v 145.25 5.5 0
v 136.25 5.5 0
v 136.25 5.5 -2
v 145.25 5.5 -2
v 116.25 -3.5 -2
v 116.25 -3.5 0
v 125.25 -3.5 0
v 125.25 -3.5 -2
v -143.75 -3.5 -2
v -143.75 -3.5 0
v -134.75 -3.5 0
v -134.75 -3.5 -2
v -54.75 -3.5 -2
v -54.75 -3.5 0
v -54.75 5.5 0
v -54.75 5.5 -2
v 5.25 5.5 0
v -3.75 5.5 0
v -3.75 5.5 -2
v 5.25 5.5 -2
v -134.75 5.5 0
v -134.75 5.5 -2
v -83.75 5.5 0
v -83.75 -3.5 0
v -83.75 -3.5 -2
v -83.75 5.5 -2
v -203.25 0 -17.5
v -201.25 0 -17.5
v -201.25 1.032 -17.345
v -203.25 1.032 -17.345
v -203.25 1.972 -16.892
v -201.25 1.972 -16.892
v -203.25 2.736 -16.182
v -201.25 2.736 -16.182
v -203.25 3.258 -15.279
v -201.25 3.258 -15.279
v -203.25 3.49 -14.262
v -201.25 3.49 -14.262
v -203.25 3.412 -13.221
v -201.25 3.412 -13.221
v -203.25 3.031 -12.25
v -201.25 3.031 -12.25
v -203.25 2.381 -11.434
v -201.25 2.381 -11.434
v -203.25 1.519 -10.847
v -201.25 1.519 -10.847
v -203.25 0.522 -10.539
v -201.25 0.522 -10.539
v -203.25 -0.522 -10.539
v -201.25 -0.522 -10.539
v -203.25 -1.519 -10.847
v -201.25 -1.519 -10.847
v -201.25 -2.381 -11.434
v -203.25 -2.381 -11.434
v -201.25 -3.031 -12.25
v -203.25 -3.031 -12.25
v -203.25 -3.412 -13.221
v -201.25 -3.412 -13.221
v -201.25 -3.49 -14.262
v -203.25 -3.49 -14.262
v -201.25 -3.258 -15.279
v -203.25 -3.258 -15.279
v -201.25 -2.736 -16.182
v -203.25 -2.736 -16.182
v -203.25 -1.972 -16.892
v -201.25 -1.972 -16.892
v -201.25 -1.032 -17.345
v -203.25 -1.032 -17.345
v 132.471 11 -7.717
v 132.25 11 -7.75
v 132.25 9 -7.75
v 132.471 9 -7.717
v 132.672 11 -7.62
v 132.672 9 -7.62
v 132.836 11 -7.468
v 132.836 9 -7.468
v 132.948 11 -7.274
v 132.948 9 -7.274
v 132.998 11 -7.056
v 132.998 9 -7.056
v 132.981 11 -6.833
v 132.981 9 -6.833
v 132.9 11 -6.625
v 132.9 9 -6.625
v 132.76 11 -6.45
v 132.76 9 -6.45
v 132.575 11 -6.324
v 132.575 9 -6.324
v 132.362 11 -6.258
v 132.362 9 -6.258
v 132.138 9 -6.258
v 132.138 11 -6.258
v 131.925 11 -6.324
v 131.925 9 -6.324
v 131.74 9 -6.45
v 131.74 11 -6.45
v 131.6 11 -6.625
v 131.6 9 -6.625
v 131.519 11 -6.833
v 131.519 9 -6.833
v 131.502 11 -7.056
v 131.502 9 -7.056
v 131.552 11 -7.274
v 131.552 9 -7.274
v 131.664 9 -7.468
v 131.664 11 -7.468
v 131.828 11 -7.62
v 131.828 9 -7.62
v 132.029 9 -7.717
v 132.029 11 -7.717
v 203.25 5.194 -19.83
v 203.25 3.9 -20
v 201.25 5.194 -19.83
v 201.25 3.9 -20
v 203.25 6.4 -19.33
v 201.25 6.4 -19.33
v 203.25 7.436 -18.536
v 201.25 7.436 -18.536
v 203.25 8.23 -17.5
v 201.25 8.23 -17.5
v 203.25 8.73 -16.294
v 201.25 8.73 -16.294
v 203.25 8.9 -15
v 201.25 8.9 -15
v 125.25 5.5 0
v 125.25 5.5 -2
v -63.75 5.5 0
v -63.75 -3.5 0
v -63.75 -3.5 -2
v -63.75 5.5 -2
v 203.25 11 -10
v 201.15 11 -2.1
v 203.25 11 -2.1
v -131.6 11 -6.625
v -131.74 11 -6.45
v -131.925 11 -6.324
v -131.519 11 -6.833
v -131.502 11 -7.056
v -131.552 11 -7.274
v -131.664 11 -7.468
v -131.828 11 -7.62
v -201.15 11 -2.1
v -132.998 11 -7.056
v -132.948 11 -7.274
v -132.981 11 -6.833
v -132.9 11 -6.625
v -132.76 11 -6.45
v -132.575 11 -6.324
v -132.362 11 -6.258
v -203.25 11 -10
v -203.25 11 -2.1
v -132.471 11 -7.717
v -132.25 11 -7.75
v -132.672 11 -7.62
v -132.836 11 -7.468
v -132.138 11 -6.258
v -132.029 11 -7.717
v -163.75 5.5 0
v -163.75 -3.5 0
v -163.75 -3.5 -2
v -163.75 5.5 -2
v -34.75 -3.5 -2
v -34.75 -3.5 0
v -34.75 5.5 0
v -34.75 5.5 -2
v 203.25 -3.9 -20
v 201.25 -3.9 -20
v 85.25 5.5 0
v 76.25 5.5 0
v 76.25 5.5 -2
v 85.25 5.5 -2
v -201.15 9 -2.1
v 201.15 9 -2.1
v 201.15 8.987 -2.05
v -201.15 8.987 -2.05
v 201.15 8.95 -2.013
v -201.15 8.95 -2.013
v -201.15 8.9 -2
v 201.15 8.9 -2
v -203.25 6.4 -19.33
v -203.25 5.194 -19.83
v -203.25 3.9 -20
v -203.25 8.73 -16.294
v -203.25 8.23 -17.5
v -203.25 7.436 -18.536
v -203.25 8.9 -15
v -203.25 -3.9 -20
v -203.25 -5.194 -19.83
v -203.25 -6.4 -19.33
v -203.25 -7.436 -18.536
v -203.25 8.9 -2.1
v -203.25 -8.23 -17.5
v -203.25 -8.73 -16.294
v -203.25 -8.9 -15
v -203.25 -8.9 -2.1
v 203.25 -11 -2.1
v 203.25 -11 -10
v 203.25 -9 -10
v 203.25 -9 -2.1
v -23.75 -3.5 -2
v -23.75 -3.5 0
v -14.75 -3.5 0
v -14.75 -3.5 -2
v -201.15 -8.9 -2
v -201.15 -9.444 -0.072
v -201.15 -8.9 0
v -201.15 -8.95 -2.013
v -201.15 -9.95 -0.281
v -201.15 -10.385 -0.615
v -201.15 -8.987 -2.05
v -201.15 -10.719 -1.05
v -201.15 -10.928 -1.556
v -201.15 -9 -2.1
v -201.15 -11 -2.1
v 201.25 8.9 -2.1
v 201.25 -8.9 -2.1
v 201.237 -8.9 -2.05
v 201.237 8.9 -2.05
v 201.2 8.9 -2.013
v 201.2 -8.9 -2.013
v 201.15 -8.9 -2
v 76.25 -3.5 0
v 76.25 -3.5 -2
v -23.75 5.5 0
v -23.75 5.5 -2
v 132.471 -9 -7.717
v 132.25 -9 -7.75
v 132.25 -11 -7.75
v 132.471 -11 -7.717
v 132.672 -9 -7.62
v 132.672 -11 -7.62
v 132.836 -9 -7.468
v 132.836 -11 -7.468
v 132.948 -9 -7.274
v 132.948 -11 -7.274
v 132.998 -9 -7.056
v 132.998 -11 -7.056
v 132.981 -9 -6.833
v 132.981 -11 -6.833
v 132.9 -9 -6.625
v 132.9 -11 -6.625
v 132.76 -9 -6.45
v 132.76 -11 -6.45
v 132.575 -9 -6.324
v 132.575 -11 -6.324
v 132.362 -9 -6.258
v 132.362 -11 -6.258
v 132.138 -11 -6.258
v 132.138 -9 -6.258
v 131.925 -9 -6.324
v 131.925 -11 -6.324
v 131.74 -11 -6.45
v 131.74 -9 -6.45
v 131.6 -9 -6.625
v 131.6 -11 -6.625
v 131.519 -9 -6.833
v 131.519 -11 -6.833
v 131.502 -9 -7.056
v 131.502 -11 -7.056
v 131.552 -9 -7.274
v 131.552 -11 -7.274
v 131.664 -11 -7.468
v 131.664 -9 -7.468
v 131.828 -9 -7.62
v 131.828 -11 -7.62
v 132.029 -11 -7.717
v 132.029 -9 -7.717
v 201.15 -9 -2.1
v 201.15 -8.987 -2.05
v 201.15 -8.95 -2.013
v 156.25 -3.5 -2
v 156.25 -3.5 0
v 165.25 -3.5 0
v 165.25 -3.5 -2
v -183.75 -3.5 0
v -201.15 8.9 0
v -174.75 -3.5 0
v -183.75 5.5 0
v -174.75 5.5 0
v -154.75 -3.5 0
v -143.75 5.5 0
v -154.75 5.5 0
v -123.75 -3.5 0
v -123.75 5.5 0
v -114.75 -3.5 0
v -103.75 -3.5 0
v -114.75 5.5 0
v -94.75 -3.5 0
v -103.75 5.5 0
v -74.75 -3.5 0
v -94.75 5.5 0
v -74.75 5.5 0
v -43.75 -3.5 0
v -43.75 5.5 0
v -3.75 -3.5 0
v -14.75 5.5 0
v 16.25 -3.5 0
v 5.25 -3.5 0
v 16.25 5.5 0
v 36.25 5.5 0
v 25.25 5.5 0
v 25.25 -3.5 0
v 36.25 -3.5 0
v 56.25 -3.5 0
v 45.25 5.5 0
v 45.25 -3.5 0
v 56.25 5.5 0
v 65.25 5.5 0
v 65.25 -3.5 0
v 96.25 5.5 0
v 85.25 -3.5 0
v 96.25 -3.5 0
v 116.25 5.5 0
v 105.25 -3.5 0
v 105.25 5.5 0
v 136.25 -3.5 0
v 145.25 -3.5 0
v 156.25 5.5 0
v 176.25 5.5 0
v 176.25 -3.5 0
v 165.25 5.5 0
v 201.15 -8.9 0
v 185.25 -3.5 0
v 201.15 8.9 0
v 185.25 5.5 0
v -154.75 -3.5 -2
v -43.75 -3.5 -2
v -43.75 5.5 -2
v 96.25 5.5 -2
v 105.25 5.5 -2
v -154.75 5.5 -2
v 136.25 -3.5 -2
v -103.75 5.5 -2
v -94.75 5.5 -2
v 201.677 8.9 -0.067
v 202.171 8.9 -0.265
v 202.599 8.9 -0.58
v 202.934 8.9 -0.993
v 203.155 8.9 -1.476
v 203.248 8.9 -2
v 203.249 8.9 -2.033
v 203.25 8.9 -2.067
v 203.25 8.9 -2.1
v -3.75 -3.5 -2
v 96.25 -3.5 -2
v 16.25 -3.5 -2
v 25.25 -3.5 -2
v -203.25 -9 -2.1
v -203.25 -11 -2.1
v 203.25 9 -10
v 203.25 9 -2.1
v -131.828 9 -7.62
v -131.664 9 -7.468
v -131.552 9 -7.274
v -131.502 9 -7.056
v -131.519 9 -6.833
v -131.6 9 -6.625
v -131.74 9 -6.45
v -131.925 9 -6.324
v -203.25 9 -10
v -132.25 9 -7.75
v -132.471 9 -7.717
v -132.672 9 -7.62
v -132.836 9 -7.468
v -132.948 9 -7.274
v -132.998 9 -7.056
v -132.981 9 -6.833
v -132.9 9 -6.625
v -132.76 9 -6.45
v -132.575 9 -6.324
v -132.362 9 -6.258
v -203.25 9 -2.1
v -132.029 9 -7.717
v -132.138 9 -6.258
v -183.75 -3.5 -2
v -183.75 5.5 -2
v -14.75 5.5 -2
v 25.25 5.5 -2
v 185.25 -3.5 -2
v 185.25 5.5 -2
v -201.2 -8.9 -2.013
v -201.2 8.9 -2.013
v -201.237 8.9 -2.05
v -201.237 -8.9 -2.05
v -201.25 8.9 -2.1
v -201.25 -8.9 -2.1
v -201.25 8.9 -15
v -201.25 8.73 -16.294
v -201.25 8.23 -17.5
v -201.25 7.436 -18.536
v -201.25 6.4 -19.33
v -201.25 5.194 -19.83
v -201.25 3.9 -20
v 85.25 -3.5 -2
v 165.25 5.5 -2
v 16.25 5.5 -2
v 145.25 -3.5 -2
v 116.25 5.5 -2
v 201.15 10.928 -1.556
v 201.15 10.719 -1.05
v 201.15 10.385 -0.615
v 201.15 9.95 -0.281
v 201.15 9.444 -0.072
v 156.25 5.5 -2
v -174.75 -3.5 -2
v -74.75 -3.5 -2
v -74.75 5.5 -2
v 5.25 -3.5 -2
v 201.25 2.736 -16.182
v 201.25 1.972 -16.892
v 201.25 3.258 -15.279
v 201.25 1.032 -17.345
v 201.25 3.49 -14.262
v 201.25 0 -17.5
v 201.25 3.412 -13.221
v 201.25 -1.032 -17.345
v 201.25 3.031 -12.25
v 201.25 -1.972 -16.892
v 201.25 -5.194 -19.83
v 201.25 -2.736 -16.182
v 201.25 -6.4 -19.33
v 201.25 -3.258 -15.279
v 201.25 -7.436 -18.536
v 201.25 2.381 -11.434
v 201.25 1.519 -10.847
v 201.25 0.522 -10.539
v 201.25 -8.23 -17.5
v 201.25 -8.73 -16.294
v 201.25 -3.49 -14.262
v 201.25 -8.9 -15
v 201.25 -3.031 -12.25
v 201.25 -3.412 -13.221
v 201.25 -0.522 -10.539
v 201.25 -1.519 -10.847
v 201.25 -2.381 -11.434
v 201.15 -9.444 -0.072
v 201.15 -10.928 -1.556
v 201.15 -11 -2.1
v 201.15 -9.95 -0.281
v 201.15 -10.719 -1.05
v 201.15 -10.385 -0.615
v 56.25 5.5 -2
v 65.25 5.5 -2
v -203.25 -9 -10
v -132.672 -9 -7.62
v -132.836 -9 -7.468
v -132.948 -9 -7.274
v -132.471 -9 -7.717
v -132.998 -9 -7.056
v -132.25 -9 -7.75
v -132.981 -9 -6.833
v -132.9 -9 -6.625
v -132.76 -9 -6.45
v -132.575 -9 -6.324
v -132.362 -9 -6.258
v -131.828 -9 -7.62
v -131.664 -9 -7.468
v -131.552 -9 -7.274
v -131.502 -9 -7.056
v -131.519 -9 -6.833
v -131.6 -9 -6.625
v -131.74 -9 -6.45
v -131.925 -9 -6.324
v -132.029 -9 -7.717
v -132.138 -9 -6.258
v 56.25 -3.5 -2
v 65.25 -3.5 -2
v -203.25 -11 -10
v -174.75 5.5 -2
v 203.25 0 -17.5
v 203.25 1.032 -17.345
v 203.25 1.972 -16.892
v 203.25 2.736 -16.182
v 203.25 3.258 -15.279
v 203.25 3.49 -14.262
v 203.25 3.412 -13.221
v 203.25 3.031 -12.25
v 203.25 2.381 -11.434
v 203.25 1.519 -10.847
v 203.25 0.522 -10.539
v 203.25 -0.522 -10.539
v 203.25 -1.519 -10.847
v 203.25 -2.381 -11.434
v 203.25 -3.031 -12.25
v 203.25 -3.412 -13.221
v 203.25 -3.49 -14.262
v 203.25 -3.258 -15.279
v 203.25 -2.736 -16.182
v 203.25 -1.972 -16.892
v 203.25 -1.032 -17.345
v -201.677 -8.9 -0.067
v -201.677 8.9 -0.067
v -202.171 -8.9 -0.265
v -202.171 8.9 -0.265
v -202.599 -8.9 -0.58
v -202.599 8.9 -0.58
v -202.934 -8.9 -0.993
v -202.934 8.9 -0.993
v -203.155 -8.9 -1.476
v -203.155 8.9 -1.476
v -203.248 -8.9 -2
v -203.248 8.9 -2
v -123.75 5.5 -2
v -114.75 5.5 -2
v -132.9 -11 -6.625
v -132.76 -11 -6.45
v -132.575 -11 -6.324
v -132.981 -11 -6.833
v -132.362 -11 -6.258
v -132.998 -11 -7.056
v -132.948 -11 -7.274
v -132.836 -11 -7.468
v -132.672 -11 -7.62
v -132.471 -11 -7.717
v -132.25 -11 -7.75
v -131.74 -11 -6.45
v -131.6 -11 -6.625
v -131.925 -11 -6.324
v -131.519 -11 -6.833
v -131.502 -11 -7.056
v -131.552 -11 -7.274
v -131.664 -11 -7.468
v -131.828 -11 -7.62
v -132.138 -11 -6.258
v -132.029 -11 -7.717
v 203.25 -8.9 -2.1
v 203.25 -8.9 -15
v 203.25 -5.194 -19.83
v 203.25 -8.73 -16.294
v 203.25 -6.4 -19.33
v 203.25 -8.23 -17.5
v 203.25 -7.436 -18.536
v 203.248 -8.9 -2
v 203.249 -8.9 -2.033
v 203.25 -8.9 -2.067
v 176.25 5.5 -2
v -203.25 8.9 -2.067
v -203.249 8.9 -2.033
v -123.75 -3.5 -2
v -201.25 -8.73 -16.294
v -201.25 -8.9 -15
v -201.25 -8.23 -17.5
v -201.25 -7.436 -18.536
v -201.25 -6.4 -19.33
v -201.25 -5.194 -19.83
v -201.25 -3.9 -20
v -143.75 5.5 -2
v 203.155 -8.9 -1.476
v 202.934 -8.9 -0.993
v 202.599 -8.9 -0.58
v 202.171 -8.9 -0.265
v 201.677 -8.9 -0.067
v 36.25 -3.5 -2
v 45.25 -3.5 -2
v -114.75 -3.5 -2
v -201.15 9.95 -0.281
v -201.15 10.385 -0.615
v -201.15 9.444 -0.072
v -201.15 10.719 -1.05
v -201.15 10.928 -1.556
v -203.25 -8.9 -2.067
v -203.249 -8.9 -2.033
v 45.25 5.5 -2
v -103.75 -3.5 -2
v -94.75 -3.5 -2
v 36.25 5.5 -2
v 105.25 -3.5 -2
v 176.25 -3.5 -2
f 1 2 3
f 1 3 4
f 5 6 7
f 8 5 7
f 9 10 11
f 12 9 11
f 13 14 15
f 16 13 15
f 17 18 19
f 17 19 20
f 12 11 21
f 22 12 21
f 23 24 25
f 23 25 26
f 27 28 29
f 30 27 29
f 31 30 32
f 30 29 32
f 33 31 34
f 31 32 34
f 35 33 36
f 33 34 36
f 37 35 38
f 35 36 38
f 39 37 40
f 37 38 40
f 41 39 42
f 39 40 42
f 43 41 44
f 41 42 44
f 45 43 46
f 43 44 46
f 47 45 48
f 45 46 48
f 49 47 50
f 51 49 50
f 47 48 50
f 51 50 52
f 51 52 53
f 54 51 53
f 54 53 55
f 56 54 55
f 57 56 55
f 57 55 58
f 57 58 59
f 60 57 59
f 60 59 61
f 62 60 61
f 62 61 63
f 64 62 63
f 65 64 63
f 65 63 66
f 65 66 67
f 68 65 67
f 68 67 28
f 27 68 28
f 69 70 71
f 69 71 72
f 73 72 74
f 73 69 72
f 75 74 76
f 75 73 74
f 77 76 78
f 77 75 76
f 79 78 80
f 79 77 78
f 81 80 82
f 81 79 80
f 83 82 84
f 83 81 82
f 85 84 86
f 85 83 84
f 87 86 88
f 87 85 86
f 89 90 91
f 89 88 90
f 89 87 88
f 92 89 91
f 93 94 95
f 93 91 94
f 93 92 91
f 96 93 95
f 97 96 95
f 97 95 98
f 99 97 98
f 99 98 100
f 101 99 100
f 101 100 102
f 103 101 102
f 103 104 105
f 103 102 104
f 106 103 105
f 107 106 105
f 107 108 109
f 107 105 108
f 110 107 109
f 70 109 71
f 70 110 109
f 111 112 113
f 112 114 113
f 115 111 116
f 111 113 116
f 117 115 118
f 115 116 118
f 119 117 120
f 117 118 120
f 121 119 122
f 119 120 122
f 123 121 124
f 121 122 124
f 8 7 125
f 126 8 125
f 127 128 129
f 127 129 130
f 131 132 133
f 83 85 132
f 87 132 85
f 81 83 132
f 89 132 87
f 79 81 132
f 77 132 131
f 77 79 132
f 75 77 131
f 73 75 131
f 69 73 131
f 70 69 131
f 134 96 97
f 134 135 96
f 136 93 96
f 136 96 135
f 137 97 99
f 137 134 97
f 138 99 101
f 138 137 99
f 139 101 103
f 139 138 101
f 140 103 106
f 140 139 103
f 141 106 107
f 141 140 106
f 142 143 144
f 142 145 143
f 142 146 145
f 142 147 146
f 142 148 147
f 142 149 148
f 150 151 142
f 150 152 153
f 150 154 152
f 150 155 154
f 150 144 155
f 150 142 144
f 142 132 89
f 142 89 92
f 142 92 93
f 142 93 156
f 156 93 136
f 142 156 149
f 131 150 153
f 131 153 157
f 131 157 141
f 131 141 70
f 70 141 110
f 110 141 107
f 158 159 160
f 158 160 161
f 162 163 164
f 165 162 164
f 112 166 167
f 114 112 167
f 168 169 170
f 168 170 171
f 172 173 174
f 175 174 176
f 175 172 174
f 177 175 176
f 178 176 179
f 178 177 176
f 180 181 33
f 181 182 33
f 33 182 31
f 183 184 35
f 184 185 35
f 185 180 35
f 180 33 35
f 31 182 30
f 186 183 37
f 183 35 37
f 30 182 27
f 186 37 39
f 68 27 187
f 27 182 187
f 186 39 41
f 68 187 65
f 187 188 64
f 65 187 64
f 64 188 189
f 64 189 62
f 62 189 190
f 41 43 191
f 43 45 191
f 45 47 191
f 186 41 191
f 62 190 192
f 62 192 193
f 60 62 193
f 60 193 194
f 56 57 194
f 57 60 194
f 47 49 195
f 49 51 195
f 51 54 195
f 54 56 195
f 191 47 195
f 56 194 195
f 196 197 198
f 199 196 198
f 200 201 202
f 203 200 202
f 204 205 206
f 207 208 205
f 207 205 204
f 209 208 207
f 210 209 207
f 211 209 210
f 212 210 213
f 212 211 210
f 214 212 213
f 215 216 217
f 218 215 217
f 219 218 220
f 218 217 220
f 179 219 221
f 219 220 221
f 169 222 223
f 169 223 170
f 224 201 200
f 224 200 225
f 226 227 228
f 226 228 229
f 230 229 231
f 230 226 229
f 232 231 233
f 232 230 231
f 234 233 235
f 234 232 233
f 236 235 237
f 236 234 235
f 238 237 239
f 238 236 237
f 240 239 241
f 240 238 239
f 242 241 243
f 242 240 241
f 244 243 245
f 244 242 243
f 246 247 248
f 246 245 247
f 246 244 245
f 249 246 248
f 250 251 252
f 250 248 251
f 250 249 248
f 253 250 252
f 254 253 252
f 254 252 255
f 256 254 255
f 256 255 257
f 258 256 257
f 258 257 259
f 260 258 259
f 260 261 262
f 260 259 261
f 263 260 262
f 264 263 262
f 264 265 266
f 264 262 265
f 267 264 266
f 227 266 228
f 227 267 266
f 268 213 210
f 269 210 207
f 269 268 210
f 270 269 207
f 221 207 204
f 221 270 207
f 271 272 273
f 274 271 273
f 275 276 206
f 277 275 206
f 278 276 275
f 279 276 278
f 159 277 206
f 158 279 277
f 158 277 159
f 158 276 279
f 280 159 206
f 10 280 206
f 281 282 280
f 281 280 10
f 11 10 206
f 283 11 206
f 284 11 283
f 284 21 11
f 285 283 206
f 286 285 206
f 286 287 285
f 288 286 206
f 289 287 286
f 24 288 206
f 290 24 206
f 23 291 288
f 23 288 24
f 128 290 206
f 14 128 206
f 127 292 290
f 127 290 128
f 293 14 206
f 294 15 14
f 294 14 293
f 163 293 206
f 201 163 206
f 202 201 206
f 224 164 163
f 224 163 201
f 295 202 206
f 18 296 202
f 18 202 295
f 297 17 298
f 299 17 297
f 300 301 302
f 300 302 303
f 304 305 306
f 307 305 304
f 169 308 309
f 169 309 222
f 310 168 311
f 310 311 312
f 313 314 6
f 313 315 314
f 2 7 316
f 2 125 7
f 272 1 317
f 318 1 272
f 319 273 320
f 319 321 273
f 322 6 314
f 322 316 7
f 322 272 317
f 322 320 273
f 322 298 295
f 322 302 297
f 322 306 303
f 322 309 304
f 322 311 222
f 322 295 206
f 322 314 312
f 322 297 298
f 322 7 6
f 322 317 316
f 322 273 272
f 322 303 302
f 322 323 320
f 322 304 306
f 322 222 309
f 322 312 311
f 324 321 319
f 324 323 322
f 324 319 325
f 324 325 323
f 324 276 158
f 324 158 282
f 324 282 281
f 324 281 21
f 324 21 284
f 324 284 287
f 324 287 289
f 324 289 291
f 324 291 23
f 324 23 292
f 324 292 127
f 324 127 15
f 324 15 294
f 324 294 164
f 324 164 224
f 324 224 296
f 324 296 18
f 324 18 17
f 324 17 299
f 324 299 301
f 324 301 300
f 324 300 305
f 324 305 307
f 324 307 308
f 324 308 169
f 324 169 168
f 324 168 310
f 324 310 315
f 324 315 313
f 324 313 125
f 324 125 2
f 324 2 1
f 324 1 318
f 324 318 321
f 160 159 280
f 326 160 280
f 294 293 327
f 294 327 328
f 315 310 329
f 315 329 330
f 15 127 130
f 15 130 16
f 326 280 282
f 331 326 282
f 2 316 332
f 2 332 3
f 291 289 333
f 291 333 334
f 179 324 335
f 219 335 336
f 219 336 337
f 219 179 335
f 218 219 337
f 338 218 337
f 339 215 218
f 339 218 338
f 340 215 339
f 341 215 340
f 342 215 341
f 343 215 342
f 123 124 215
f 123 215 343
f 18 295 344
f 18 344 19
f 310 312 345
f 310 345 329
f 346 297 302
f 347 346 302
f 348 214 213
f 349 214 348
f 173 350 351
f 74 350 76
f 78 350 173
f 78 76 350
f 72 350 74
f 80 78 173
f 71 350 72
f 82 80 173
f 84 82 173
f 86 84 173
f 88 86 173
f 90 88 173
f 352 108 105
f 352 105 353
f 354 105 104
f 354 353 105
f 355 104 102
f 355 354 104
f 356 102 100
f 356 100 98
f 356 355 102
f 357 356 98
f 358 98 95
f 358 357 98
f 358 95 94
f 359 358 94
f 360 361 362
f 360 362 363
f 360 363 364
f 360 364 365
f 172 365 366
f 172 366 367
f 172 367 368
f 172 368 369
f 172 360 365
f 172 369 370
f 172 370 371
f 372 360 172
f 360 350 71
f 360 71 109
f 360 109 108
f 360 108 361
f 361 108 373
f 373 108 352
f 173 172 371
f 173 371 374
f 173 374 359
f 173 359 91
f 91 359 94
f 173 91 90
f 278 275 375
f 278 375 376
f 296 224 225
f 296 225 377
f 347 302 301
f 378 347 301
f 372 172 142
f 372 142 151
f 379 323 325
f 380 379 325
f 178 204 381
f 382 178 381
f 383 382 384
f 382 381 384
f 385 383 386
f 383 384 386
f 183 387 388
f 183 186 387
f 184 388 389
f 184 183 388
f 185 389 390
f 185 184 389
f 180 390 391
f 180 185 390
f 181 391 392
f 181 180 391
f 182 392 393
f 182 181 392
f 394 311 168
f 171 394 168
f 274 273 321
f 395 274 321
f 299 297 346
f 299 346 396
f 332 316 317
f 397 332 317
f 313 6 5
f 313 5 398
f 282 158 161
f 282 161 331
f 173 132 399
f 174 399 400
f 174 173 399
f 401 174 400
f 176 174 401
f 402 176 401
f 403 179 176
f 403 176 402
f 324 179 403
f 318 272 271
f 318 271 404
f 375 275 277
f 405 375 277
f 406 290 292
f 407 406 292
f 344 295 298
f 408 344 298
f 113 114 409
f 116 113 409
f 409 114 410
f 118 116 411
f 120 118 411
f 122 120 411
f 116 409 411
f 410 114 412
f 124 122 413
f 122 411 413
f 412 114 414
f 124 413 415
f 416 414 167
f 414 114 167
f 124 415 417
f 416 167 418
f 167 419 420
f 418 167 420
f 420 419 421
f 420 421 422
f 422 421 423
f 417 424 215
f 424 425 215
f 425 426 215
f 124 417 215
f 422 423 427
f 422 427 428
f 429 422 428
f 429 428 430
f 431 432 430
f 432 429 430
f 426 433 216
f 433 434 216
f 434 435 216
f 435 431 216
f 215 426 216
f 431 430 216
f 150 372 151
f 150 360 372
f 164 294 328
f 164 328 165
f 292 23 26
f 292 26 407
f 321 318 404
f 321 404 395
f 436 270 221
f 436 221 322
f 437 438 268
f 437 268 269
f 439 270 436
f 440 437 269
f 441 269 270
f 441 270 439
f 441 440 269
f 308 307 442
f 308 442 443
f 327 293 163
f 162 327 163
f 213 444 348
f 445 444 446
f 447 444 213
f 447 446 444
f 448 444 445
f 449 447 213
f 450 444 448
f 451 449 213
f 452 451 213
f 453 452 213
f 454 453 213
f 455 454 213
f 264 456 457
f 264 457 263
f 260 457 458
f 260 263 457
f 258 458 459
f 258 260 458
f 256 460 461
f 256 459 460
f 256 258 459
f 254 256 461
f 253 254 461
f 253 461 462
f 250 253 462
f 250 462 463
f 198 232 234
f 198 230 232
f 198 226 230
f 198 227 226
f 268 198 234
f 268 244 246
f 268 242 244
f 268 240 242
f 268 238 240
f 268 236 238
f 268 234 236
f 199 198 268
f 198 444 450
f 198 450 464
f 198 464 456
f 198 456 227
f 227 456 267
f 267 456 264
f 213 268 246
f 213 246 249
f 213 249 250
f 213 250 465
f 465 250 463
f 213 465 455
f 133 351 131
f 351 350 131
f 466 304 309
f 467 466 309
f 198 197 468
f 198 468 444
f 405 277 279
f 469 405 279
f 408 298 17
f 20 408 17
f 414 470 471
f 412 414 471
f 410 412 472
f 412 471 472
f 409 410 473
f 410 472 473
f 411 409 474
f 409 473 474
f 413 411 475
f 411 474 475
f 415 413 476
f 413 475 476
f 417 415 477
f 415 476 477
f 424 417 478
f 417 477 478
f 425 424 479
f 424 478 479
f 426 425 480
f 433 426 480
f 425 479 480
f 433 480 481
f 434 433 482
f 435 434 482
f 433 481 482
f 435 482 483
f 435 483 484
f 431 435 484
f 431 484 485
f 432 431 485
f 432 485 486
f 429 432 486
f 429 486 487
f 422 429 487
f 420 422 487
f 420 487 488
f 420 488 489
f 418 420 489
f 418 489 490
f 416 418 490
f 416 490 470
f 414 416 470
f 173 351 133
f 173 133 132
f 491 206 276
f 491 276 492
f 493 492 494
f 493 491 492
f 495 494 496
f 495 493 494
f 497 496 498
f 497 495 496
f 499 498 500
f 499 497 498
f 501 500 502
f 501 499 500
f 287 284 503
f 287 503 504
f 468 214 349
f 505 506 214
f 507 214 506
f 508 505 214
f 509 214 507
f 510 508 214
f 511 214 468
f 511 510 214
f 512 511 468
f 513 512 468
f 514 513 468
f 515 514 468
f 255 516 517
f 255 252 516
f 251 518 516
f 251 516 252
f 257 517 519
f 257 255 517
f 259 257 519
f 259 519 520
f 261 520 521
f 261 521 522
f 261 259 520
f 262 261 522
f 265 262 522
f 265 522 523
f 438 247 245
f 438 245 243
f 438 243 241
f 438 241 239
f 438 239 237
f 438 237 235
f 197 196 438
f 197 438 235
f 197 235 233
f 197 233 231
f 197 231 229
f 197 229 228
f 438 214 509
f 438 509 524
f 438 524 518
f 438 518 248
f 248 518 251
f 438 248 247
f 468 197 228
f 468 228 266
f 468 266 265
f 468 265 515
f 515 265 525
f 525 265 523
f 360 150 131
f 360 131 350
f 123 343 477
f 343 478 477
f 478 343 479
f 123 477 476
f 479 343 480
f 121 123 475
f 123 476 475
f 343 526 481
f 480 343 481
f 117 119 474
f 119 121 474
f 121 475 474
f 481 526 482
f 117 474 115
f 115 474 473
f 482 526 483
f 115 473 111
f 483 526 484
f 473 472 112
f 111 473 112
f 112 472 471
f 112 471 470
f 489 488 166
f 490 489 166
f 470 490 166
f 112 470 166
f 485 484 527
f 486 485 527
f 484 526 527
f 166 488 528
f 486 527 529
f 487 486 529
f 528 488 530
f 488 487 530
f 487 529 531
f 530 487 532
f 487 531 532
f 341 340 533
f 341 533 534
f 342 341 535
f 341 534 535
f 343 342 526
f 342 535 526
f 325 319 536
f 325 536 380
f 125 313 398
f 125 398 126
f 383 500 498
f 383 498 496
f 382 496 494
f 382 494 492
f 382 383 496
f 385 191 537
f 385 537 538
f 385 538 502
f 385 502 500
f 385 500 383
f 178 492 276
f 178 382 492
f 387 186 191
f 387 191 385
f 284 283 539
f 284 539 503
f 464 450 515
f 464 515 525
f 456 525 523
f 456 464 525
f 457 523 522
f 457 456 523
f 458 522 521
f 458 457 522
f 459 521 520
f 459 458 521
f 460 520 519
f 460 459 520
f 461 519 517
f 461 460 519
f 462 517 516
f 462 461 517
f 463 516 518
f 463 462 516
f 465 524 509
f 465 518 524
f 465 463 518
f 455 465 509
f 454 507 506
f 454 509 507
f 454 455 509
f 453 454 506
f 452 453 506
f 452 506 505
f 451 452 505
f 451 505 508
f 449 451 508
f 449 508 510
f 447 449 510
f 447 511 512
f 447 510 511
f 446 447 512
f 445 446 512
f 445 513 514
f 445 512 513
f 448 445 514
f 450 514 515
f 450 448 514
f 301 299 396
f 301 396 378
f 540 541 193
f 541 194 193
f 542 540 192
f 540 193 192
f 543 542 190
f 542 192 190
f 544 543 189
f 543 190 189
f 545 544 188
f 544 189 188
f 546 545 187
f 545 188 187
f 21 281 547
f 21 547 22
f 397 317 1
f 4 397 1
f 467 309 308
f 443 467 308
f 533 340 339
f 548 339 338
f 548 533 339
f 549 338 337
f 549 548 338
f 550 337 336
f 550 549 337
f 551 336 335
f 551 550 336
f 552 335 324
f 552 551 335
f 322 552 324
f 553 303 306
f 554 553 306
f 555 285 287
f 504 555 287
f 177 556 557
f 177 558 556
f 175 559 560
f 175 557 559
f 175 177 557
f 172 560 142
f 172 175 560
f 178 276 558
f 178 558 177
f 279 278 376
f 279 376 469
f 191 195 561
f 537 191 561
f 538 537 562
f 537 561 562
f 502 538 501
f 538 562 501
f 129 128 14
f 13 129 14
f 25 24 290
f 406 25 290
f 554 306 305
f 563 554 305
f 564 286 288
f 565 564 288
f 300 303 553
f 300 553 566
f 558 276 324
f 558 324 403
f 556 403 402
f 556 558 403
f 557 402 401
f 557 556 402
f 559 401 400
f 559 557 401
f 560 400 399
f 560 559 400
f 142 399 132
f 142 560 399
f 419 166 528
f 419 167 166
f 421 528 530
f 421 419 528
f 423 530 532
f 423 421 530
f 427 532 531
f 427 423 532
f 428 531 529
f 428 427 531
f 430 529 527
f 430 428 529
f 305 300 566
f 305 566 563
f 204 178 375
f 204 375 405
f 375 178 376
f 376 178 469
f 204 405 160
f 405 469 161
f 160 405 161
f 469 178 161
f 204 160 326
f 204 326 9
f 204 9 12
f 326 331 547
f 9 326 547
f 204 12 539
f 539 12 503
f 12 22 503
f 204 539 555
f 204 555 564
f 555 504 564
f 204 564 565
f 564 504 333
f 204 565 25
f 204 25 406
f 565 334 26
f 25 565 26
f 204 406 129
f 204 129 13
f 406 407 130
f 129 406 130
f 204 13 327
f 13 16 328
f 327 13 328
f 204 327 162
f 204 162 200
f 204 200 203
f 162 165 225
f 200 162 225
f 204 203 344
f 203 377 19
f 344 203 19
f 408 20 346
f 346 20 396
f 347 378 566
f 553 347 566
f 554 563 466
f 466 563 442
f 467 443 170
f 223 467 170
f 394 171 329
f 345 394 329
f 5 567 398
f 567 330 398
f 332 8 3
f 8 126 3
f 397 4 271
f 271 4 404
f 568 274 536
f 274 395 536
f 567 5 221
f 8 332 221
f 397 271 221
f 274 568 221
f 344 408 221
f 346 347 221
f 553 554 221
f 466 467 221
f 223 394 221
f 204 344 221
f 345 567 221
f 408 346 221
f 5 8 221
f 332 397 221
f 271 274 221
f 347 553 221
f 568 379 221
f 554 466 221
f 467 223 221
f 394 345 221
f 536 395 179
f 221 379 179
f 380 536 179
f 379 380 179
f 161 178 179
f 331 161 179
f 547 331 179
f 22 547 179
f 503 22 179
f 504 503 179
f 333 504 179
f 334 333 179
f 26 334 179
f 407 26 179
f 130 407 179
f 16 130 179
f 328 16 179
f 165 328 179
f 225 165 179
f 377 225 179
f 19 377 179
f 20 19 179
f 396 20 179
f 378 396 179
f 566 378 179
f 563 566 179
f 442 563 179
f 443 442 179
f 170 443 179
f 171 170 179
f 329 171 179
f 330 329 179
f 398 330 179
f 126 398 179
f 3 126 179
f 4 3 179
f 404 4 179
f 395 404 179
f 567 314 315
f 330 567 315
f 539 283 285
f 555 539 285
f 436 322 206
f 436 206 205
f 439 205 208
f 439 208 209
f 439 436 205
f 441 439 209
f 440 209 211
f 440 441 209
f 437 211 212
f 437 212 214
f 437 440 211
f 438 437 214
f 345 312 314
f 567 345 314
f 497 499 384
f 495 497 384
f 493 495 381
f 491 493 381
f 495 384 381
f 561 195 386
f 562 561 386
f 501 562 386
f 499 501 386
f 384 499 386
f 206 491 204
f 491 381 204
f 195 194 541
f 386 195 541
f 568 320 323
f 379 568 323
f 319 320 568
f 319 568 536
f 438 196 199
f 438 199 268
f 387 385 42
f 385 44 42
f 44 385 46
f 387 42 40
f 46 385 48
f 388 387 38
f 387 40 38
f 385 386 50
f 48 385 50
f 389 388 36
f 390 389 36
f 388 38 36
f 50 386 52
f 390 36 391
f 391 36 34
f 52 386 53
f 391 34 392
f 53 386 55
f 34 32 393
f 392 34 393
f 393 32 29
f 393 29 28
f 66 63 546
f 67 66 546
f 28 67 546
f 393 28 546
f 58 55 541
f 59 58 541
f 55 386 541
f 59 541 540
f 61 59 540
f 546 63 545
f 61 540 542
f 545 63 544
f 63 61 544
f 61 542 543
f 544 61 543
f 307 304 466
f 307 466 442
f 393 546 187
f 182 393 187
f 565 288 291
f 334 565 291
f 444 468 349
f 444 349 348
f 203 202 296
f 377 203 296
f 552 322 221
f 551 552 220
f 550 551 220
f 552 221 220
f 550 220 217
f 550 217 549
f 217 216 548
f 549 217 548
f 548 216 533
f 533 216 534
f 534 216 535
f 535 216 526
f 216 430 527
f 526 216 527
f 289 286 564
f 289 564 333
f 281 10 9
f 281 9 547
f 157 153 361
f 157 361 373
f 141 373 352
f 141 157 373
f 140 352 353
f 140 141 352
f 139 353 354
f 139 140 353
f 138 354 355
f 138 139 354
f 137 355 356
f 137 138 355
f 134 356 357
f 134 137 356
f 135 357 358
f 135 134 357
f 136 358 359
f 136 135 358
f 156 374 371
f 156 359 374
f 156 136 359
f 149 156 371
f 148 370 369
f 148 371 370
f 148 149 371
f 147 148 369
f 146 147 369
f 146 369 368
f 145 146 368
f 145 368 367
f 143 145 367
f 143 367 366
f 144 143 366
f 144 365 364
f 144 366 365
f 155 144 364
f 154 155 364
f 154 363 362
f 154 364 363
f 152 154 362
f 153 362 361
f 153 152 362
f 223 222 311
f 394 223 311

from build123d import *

# Parameters (mm, degrees)
SKETCH_1_W                         = 406.5
SKETCH_1_H                         = 22
SM_BASE_FLANGE_1_DEPTH             = 2
SM_EDGE_FLANGE_1_STRIP_W           = 8.2
SM_EDGE_FLANGE_1_STRIP_H           = 2
SM_EDGE_FLANGE_1_STRIP_CUT_DEPTH   = 406.5
SM_EDGE_FLANGE_1_STRIP_2_W         = 8.2
SM_EDGE_FLANGE_1_STRIP_2_H         = 2
SM_EDGE_FLANGE_1_STRIP_CUT_2_DEPTH = 406.5
SM_EDGE_FLANGE_1_DEPTH             = 406.5
SM_EDGE_FLANGE_1_BEND_DEPTH        = 406.5
SM_START                           = -11
SM_EDGE_FLANGE_2_DEPTH             = 22
SM_EDGE_FLANGE_2_2_DEPTH           = 2.1
SM_START_2                         = 8.9
SM_EDGE_FLANGE_2_3_DEPTH           = 2.1
SM_START_3                         = -8.9
SM_EDGE_FLANGE_2_4_DEPTH           = 17.8
SKETCH_18_W                        = 9
SKETCH_18_H                        = 9
CUT_EXTRUDE_1_DEPTH                = 10
PATTERN_LINEAR_1_COUNT             = 19
PATTERN_LINEAR_1_PITCH             = 20
FILLET_1_R                         = 5
SKETCH_19_R                        = 3.5
CUT_EXTRUDE_2_DEPTH                = 408.140332072
CUT_EXTRUDE_3_DEPTH                = 206.413150747
CUT_EXTRUDE_3_DEPTH_BACK           = 206.413150747
SKETCH_20_R                        = 0.75


# Read off the part's stored shape, not the designer's step: 边线-法兰2
# Sheet-metal steps are written as plain solids
with BuildPart() as part:
    # Sketch 1 → 基体-法兰1 (new body)
    with BuildSketch(Plane.XY):
        Rectangle(SKETCH_1_W, SKETCH_1_H)
    extrude(amount=-SM_BASE_FLANGE_1_DEPTH)

    # 边线-法兰1 strip (across the edge) → 边线-法兰1 strip cut (cut)
    with BuildSketch(Plane(origin=(203.25, -11, -2), x_dir=(0, 1, 0), z_dir=(-1, 0, 0))):
        with Locations((-2, -1)):
            Rectangle(SM_EDGE_FLANGE_1_STRIP_W, SM_EDGE_FLANGE_1_STRIP_H)
    extrude(amount=SM_EDGE_FLANGE_1_STRIP_CUT_DEPTH, mode=Mode.SUBTRACT)

    # 边线-法兰1 strip 2 (across the edge) → 边线-法兰1 strip cut 2 (cut)
    with BuildSketch(Plane(origin=(-203.25, 11, -2), x_dir=(0, -1, 0), z_dir=(1, 0, 0))):
        with Locations((-2, -1)):
            Rectangle(SM_EDGE_FLANGE_1_STRIP_2_W, SM_EDGE_FLANGE_1_STRIP_2_H)
    extrude(amount=SM_EDGE_FLANGE_1_STRIP_CUT_2_DEPTH, mode=Mode.SUBTRACT)

    # 边线-法兰1 section (across the edge) → 边线-法兰1 (add)
    with BuildSketch(Plane(origin=(203.25, -11, -2), x_dir=(0, 1, 0), z_dir=(-1, 0, 0))):
        with BuildLine():
            Line((0, 0.1), (0, 8))
            Line((0, 8), (2, 8))
            Line((2, 8), (2, 0.1))
            ThreePointArc((2, 0.1), (2.029289322, 0.029289322), (2.1, 0))
            Line((2.1, 0), (2.1, -2))
            ThreePointArc((2.1, -2), (0.61507576, -1.38492424), (0, 0.1))
        make_face()
    extrude(amount=SM_EDGE_FLANGE_1_DEPTH)

    # 边线-法兰1 section 2 (across the edge) → 边线-法兰1 bend (add)
    with BuildSketch(Plane(origin=(-203.25, 11, -2), x_dir=(0, -1, 0), z_dir=(1, 0, 0))):
        with BuildLine():
            Line((0, 0.1), (0, 8))
            Line((0, 8), (2, 8))
            Line((2, 8), (2, 0.1))
            ThreePointArc((2, 0.1), (2.029289322, 0.029289322), (2.1, 0))
            Line((2.1, 0), (2.1, -2))
            ThreePointArc((2.1, -2), (0.61507576, -1.38492424), (0, 0.1))
        make_face()
    extrude(amount=SM_EDGE_FLANGE_1_BEND_DEPTH)

    # 边线-法兰2 outline → 边线-法兰2 (cut)
    with BuildSketch(Plane(origin=(0, 0, 0), x_dir=(1, 0, 0), z_dir=(0, 1, 0)).offset(SM_START)):
        with BuildLine():
            Line((201.25, 2.1), (201.15, 2.1))
            Line((201.15, 2.1), (201.15, 2))
            ThreePointArc((201.15, 2), (201.220710678, 2.029289322), (201.25, 2.1))
        make_face()
        with BuildLine():
            ThreePointArc((203.25, 2.1), (202.63492424, 0.61507576), (201.15, 0))
            Line((201.15, 0), (203.25, 0))
            Line((203.25, 0), (203.25, 2.1))
        make_face()
        with BuildLine():
            ThreePointArc((-201.25, 2.1), (-201.220710678, 2.029289322), (-201.15, 2))
            Line((-201.15, 2), (-201.15, 2.1))
            Line((-201.15, 2.1), (-201.25, 2.1))
        make_face()
        with BuildLine():
            Line((-203.25, 0), (-201.15, 0))
            ThreePointArc((-201.15, 0), (-202.63492424, 0.61507576), (-203.25, 2.1))
            Line((-203.25, 2.1), (-203.25, 0))
        make_face()
    extrude(amount=SM_EDGE_FLANGE_2_DEPTH, mode=Mode.SUBTRACT)

    # Sm Edge Flange 2 2 outline → Sm Edge Flange 2 2 (cut)
    with BuildSketch(Plane(origin=(0, 0, 0), x_dir=(1, 0, 0), z_dir=(0, 1, 0)).offset(SM_START)):
        with BuildLine():
            Line((203.25, 2.1), (201.25, 2.1))
            ThreePointArc((201.25, 2.1), (201.220710678, 2.029289322), (201.15, 2))
            Line((201.15, 2), (201.15, 0))
            ThreePointArc((201.15, 0), (202.63492424, 0.61507576), (203.25, 2.1))
        make_face()
        with BuildLine():
            ThreePointArc((-203.25, 2.1), (-202.63492424, 0.61507576), (-201.15, 0))
            Line((-201.15, 0), (-201.15, 2))
            ThreePointArc((-201.15, 2), (-201.220710678, 2.029289322), (-201.25, 2.1))
            Line((-201.25, 2.1), (-203.25, 2.1))
        make_face()
    extrude(amount=SM_EDGE_FLANGE_2_2_DEPTH, mode=Mode.SUBTRACT)

    # Sm Edge Flange 2 3 outline → Sm Edge Flange 2 3 (cut)
    with BuildSketch(Plane(origin=(0, 0, 0), x_dir=(1, 0, 0), z_dir=(0, 1, 0)).offset(SM_START_2)):
        with BuildLine():
            Line((203.25, 2.1), (201.25, 2.1))
            ThreePointArc((201.25, 2.1), (201.220710678, 2.029289322), (201.15, 2))
            Line((201.15, 2), (201.15, 0))
            ThreePointArc((201.15, 0), (202.63492424, 0.61507576), (203.25, 2.1))
        make_face()
        with BuildLine():
            ThreePointArc((-203.25, 2.1), (-202.63492424, 0.61507576), (-201.15, 0))
            Line((-201.15, 0), (-201.15, 2))
            ThreePointArc((-201.15, 2), (-201.220710678, 2.029289322), (-201.25, 2.1))
            Line((-201.25, 2.1), (-203.25, 2.1))
        make_face()
    extrude(amount=SM_EDGE_FLANGE_2_3_DEPTH, mode=Mode.SUBTRACT)

    # Sm Edge Flange 2 4 outline → Sm Edge Flange 2 4 (add)
    with BuildSketch(Plane(origin=(0, 0, 0), x_dir=(1, 0, 0), z_dir=(0, 1, 0)).offset(SM_START_3)):
        with BuildLine():
            Line((201.25, 20), (201.25, 2.1))
            ThreePointArc((201.25, 2.1), (201.220710678, 2.029289322), (201.15, 2))
            Line((201.15, 2), (203.247617696, 2))
            ThreePointArc((203.247617696, 2), (203.24940434, 2.049985814), (203.25, 2.1))
            Line((203.25, 2.1), (203.25, 20))
            Line((203.25, 20), (201.25, 20))
        make_face()
        with BuildLine():
            Line((-203.247617696, 2), (-201.15, 2))
            ThreePointArc((-201.15, 2), (-201.220710678, 2.029289322), (-201.25, 2.1))
            Line((-201.25, 2.1), (-201.25, 20))
            Line((-201.25, 20), (-203.25, 20))
            Line((-203.25, 20), (-203.25, 2.1))
            ThreePointArc((-203.25, 2.1), (-203.24940434, 2.049985814), (-203.247617696, 2))
        make_face()
    extrude(amount=SM_EDGE_FLANGE_2_4_DEPTH)

    # 草图18 → 切除-拉伸1 (cut)
    with BuildSketch(Plane.XY):
        with Locations((-179.25, 1)):
            Rectangle(SKETCH_18_W, SKETCH_18_H)
    cut_extrude_1 = extrude(amount=-CUT_EXTRUDE_1_DEPTH, mode=Mode.SUBTRACT)

    # 阵列(线性)1: 切除-拉伸1 ×19
    with Locations(*[(i * PATTERN_LINEAR_1_PITCH, 0, 0) for i in range(1, PATTERN_LINEAR_1_COUNT)]):
        add(cut_extrude_1, mode=Mode.SUBTRACT)

    # 圆角1
    fillet_1_edges = [part.edges().sort_by_distance(p)[0] for p in [
        (-202.25, -8.9, -20),
        (-202.25, 8.9, -20),
        (202.25, 8.9, -20),
        (202.25, -8.9, -20),
    ]]
    fillet(fillet_1_edges, radius=FILLET_1_R)

    # 草图19 → 切除-拉伸2 (cut, through all)
    with BuildSketch(Plane(origin=(203.25, 0, 0), x_dir=(0, 0, -1), z_dir=(1, 0, 0))):
        with Locations((14, 0)):
            Circle(SKETCH_19_R)
    extrude(amount=-CUT_EXTRUDE_2_DEPTH, mode=Mode.SUBTRACT)

    # 草图20 → 切除-拉伸3 (cut, two sides: drawn at the far end of the back side and taken through both)
    with BuildSketch(Plane.XZ.offset(11).offset(-CUT_EXTRUDE_3_DEPTH_BACK)):
        with Locations(Location((132.25, -7, 0), (0, 0, 270))):
            Circle(SKETCH_20_R)
        with Locations(Location((-132.25, -7, 0), (0, 0, 270))):
            Circle(SKETCH_20_R)
    extrude(amount=CUT_EXTRUDE_3_DEPTH + CUT_EXTRUDE_3_DEPTH_BACK, mode=Mode.SUBTRACT)


solid = part.part
